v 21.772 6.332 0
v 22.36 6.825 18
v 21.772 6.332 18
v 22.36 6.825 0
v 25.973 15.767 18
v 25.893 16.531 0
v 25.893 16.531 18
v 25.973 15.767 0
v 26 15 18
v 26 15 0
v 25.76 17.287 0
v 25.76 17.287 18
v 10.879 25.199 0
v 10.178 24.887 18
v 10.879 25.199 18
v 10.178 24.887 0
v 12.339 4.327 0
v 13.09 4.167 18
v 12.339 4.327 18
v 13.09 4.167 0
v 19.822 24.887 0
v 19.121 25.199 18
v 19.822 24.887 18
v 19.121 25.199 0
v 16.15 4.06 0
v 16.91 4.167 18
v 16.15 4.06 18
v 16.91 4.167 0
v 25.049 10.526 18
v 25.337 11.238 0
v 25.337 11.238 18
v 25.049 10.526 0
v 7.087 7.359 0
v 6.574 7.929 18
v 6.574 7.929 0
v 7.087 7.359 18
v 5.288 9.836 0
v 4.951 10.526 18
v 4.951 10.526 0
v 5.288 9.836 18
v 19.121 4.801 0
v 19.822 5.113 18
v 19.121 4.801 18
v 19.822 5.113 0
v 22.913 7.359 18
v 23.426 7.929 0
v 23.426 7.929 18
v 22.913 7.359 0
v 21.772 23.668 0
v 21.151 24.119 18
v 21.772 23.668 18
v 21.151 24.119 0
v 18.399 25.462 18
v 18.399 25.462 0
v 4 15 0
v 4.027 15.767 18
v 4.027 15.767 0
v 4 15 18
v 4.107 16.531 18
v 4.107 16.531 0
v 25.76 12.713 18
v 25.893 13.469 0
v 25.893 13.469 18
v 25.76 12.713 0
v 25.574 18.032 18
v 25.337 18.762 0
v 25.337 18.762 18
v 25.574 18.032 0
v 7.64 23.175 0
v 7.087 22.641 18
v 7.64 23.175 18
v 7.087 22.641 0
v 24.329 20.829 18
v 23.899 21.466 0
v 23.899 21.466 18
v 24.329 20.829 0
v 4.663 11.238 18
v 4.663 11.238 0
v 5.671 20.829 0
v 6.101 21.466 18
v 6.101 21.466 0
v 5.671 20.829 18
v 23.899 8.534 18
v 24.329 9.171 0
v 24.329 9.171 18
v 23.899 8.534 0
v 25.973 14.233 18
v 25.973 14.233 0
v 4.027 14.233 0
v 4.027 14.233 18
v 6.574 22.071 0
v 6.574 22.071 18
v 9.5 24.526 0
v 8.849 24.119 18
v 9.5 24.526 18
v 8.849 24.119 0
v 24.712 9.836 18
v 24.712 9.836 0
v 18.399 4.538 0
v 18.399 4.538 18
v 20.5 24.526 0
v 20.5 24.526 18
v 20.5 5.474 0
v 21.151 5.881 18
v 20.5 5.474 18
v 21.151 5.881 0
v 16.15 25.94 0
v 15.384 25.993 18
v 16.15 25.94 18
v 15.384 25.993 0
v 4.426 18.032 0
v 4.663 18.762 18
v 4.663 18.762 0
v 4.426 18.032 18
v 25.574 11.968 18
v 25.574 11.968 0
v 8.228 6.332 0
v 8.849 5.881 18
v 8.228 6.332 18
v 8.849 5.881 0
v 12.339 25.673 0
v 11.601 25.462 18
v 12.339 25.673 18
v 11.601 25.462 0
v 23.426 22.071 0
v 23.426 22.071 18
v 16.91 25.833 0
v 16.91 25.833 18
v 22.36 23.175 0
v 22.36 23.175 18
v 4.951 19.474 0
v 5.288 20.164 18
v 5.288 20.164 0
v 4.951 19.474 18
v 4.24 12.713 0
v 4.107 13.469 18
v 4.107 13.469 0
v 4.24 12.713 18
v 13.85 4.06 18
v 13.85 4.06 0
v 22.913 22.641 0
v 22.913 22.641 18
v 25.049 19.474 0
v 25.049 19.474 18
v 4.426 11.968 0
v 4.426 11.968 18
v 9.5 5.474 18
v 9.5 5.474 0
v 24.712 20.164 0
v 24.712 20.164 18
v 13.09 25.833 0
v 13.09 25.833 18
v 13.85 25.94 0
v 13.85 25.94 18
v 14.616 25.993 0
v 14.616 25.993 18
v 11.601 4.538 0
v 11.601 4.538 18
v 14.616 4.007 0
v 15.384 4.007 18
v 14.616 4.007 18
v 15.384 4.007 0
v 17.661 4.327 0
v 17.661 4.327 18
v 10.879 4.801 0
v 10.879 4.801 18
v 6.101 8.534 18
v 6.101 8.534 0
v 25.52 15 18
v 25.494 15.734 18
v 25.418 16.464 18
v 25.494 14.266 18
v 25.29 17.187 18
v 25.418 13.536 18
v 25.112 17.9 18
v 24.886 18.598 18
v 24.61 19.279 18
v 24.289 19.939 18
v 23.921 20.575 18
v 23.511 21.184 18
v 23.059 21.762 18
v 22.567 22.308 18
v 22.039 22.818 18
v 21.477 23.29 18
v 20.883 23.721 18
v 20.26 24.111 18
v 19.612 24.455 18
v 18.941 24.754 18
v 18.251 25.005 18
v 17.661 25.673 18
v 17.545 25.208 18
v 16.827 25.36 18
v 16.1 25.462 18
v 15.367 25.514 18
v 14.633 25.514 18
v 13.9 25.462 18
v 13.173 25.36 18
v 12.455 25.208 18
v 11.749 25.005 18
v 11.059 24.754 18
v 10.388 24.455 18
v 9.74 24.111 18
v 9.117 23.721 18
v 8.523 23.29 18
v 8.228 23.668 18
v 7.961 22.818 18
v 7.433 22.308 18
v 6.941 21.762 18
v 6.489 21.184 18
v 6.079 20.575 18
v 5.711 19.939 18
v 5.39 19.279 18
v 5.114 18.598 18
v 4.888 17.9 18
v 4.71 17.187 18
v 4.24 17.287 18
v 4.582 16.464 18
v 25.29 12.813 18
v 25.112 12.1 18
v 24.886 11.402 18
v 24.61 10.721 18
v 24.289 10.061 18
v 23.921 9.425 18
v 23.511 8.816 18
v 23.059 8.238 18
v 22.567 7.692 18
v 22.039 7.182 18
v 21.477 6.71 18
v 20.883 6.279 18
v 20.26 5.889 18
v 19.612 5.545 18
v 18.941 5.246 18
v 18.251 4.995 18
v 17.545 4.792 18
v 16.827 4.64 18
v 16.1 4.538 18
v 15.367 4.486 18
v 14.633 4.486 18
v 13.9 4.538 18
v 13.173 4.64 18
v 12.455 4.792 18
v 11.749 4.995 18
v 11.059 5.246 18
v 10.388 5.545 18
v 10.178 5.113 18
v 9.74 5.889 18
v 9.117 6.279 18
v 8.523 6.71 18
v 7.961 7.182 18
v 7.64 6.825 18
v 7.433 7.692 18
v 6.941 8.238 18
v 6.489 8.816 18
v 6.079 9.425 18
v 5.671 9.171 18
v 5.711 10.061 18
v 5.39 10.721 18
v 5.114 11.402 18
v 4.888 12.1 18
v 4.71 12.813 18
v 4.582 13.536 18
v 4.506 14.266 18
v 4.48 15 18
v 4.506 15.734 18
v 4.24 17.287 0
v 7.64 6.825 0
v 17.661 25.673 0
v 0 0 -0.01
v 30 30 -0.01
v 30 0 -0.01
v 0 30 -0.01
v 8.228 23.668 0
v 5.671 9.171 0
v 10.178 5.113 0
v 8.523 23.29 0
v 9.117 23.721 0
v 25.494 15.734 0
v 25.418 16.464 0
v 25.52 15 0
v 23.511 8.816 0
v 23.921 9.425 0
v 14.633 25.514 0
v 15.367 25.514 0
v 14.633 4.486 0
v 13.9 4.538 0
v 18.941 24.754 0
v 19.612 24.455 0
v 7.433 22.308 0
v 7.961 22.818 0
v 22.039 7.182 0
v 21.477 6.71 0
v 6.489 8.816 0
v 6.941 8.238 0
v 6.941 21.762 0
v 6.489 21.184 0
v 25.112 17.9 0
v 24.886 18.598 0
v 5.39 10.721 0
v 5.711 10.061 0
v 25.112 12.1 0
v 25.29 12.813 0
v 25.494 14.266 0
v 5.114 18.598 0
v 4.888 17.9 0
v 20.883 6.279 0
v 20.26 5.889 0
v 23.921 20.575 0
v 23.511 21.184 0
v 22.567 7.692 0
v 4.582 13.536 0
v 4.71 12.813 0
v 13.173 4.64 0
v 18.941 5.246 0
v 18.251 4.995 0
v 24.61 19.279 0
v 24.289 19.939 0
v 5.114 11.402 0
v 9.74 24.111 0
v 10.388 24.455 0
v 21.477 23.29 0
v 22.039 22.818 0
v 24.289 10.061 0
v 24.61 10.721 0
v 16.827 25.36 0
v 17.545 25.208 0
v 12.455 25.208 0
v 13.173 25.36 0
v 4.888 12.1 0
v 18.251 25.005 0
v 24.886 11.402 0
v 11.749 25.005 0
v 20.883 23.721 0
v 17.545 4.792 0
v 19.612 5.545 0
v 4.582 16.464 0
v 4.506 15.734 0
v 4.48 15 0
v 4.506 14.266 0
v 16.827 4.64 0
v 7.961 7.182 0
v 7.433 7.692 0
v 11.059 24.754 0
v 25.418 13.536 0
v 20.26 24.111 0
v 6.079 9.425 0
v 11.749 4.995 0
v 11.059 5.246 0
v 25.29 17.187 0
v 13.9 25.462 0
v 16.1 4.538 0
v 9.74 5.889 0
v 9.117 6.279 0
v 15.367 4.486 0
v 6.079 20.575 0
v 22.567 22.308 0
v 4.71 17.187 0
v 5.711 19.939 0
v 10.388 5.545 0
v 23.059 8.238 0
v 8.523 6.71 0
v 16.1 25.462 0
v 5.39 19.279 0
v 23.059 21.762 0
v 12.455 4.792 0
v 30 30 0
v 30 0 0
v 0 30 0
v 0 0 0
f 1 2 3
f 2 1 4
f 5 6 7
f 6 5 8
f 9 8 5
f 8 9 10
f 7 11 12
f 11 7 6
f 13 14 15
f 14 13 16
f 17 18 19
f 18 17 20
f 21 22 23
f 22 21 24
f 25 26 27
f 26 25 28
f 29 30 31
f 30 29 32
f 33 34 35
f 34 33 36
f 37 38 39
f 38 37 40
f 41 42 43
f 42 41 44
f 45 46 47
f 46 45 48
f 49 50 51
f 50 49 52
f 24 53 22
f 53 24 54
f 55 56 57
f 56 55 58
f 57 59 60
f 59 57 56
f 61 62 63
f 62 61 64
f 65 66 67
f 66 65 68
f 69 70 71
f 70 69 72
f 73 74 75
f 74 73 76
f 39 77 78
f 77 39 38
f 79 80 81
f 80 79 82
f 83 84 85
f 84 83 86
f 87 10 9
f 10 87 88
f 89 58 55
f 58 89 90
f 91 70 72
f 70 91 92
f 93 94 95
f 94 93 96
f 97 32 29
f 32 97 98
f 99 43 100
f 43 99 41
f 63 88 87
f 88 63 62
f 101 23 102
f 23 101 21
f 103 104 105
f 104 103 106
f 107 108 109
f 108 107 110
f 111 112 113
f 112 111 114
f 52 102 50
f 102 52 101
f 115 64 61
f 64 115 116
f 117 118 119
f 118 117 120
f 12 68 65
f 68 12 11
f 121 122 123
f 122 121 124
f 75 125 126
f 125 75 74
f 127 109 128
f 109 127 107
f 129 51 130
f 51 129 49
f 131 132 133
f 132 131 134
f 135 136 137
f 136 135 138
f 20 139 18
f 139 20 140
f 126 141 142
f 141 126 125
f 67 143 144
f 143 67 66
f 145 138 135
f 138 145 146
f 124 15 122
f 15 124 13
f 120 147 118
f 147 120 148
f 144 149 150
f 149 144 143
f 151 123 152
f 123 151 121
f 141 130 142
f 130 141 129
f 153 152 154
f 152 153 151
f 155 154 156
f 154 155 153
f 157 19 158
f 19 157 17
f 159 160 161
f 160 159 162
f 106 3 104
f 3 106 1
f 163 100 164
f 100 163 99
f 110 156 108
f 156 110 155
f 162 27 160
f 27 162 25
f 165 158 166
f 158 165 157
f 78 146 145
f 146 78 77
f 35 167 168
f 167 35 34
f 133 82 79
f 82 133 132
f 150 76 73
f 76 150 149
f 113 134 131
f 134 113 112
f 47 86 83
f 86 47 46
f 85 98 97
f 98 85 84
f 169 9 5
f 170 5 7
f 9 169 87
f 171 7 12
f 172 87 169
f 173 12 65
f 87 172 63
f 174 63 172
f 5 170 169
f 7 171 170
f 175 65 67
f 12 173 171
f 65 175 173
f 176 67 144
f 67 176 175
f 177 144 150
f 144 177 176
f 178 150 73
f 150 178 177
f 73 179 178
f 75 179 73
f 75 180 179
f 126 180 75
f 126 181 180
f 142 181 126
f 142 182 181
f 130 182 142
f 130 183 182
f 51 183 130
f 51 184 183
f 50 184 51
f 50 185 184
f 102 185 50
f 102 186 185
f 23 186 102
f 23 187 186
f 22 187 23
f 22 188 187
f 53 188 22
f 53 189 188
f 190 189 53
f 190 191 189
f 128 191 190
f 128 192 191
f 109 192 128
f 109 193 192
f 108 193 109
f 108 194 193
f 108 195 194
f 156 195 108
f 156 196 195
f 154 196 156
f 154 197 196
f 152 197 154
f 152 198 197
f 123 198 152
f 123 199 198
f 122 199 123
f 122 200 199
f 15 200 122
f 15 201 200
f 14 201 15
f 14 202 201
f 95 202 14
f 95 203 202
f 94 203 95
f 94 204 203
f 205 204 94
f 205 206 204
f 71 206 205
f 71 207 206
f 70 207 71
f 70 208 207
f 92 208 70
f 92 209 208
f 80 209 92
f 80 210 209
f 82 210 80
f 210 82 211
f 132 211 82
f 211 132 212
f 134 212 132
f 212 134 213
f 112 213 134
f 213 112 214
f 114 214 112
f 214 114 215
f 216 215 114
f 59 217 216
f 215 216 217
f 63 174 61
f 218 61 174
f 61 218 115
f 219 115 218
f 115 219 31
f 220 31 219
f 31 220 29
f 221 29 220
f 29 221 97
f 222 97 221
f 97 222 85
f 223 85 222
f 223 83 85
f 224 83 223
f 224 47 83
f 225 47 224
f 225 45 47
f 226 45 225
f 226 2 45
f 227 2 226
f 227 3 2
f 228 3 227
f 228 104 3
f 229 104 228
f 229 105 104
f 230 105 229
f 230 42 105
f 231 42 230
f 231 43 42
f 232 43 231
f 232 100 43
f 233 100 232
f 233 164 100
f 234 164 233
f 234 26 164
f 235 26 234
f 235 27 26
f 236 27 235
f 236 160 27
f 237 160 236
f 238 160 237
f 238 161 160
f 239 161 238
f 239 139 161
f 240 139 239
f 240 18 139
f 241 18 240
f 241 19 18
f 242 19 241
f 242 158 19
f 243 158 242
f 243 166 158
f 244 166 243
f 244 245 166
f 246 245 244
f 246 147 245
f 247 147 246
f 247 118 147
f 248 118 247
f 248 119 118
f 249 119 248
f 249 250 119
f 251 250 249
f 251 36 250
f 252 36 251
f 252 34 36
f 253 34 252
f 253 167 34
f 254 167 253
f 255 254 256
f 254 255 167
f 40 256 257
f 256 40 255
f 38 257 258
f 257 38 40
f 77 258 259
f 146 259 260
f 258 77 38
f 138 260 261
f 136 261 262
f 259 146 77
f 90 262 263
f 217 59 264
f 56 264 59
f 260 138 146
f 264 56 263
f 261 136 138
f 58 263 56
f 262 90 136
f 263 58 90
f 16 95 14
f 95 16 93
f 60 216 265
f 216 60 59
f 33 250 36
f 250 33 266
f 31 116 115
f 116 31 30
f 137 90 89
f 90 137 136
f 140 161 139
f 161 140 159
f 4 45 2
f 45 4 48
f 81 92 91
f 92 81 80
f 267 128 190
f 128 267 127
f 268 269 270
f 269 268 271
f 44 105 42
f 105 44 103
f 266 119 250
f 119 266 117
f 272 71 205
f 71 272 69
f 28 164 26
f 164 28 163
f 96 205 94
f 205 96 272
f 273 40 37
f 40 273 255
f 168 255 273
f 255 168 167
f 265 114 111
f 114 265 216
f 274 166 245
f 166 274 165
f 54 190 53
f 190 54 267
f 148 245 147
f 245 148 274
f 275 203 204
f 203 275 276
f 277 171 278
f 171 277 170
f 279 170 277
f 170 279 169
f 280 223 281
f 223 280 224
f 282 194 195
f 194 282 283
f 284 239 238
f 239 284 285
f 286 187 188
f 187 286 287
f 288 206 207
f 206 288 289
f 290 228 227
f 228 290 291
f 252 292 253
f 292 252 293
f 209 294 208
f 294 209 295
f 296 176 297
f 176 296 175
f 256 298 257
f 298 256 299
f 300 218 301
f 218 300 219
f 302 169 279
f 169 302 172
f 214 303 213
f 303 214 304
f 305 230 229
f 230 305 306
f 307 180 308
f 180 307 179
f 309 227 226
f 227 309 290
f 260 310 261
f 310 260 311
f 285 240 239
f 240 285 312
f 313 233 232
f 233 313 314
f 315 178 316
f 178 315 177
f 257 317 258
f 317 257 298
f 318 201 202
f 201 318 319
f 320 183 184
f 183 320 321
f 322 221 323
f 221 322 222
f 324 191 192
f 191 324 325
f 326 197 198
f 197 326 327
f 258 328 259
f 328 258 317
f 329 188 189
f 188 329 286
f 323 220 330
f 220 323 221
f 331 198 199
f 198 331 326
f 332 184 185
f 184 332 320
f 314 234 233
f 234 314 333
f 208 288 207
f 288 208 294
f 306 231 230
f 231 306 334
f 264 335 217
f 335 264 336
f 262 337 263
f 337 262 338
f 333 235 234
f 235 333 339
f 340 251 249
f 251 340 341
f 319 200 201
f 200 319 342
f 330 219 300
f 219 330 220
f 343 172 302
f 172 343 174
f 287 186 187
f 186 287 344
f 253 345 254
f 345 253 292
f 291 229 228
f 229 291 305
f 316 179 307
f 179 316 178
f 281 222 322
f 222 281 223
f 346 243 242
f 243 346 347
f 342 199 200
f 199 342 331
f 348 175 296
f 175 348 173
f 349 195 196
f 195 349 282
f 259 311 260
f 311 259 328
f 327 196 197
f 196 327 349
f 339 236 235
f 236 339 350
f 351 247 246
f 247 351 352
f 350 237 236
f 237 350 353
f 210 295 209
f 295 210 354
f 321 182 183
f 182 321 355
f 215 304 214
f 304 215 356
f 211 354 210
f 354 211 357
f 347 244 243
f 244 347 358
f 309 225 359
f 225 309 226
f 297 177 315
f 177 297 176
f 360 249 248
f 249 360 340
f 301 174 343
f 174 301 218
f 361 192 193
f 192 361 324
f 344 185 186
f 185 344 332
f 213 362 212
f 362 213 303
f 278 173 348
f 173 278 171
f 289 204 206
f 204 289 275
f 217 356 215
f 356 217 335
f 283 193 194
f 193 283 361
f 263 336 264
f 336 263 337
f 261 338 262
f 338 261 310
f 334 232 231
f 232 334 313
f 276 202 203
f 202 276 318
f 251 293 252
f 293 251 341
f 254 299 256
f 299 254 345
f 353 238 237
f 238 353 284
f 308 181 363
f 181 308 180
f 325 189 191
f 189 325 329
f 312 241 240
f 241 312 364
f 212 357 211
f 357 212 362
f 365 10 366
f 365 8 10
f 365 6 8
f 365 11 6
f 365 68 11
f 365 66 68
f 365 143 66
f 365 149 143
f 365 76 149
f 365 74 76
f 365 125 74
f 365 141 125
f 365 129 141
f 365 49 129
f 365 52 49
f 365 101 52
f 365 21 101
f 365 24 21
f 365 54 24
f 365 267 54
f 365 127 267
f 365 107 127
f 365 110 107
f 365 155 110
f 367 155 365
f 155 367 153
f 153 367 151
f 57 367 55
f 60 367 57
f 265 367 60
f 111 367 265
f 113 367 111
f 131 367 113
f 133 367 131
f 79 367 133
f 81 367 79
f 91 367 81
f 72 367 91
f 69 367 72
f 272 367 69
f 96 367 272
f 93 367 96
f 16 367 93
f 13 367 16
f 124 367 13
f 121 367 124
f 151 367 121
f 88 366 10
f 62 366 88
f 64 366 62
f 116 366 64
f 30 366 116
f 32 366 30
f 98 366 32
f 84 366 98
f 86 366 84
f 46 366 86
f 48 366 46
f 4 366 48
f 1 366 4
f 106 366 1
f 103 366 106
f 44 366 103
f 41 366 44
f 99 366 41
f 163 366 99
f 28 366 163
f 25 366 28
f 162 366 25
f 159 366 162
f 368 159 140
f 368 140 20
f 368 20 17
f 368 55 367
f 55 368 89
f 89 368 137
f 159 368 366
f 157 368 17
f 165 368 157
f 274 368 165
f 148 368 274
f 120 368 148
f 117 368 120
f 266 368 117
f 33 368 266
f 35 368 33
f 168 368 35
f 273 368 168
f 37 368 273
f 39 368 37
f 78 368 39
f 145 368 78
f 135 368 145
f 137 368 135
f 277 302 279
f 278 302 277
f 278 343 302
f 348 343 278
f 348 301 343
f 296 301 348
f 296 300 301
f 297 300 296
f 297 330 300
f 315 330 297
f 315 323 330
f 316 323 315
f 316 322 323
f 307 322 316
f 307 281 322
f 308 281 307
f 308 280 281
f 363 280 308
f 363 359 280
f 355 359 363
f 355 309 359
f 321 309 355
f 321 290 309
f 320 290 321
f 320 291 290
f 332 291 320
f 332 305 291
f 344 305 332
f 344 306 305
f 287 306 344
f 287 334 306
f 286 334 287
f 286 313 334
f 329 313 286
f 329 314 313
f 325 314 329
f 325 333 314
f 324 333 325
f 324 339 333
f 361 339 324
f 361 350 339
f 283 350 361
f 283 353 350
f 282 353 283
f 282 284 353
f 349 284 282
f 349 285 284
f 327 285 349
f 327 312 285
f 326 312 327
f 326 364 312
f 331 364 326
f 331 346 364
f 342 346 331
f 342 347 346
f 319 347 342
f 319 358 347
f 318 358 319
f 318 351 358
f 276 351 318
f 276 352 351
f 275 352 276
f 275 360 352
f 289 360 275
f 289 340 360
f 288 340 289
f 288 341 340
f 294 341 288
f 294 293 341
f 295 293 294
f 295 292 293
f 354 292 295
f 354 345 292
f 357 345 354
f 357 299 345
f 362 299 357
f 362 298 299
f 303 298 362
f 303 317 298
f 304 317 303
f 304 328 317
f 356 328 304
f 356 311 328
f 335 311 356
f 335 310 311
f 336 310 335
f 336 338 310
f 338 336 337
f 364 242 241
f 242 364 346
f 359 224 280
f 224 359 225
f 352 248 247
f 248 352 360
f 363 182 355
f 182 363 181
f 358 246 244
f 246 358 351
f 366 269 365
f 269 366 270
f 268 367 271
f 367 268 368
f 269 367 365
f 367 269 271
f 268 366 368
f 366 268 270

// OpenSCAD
// file: ../Base/PlacementOptions.scad
// Fischertechnik Box Foundation
// Placement Options

// Alignment
NoAlign = 0;
AlignLeft = 1;
AlignBottom = 2;
AlignCenter = 3;
AlignRight = 4;
AlignTop = 5;

// Element rotation degree steps
rotations = [0, -90, -180, -270];

// Rotation
NoRotation = 0;
Rotate0 = 0;
Rotate90 = 1;
Rotate180 = 2;
Rotate270 = 3;

// Docking (seen from above)
NoDock = -1;
DockLeft = 0;
DockTop = 1;
DockRight = 2;
DockCorner = 2;
DockBottom = 3;

// Web corners
LowerLeft = 0;
UpperLeft = 1;
UpperRight = 2;
LowerRight = 3;

// Web position relative to corner
LeftOfCorner = 0;
RightOfCorner = 1;
// file: ../Base/Boxes.scad
// Fischertechnik Box Foundation
// Pre-designed Boxes

use <Constants.scad>

include <PlacementOptions.scad>

box190Width = 190;
box190Depth = 130;
box130Width = 130;
box130Depth = 95;

// Values are from an original ec3 box
topBottomDifference = 1.5;
outerHeight = 40;
innerHeight = 38.2;
baseThickness = outerHeight - innerHeight;
stackExcess = 5.7;
radius = 3.5;
wallThickness = 1.5;
tolerance = 0.2;
stackOffset = innerHeight - stackExcess;

boxUsageHeight = stackOffset;
boxWallThickness = wallThickness;
boxBaseThickness = baseThickness;
boxWebWidth = 3.0;

// getBoxWallThickness()
// Gets the wall thickness of a Fischertechnik Box
function getBoxWallThickness() = boxWallThickness;

// getBoxUsageHeight()
// Gets the usable height of a Fischertechnik box
function getBoxUsageHeight() = boxUsageHeight;

// getBoxInnerHeight()
// Gets the inner height of a Fischertechnik box, including the stack excess
function getBoxInnerHeight() = innerHeight;

// getBoxBaseThickness()
// Gets the thickness of the Fischertechnik box base.
function getBoxBaseThickness() = boxBaseThickness;

// getBoxWebWidth()
// Gets the width of a box web
function getBoxWebWidth() = boxWebWidth;

// getBox190Space()
// Gets the usable inner space of a Box 190 as an x/y-list
function getBox190Space() = [
    box190Width - 2*getBoxWallThickness() - topBottomDifference, 
    box190Depth - 2*getBoxWallThickness() - topBottomDifference ];

// BoxBase(width, depth)
// Creates an empty stackable Fischertechnik compatible box
// width = Outer width of the box (190, 130, ...)
// depth = Outer depth of the box (130, 95, ...)

module BoxBase(width, depth, height=outerHeight) {    
    thinPlate = 0.01;

    innerHeight = height - baseThickness;    
    
    module BodyPlate(width, depth) {
        translate([radius, radius])
        hull() {
            w = width-2*radius;
            d = depth-2*radius;
            cube([w, d, thinPlate]);
            cylinder(thinPlate, r=radius, $fn=getFragments());
            translate([w, 0])
                cylinder(thinPlate, r=radius, $fn=getFragments());
            translate([w, d])
                cylinder(thinPlate, r=radius, $fn=getFragments());
            translate([0, d])
                cylinder(thinPlate, r=radius, $fn=getFragments());
        }
    }
    
    module Body(tolerance=tolerance) {
        hull() {
            // Bottom with tolerance to fit into the original boxes when stacked
            translate([-wallThickness+tolerance, -wallThickness+tolerance, -baseThickness])
                BodyPlate(width-topBottomDifference-2*tolerance, depth-topBottomDifference-2*tolerance);
            
            // Top
            translate([-wallThickness-topBottomDifference/2, -wallThickness-topBottomDifference/2, innerHeight-thinPlate])
                BodyPlate(width, depth);
         }
    }

    module Cutoff() {
        hull() {
            coWidth = width - 2*wallThickness;
            coDepth = depth - 2*wallThickness;
            
            // Bottom
            BodyPlate(coWidth-topBottomDifference, coDepth-topBottomDifference);

            // Top
            translate([-topBottomDifference/2, -topBottomDifference/2, innerHeight+thinPlate]) 
                BodyPlate(coWidth, coDepth);
        }
    }
    
    difference() {        
        Body();
        Cutoff();
        stackOffset = innerHeight - stackExcess;
        translate([0, 0, stackOffset + baseThickness])
            Body(tolerance=0);
    }
}

// Creates the Fischertechnik empty box 130x190 mm and places it at position 0,0
// 190x130 are the outer sizes, the inner space is slightly smaller. Use getBox190Space() to get the inner sizes.
// The box is positioned that the usable inner space is at the 0,0,0 position. The

module Box190() {
    BoxBase(box190Width, box190Depth);
}

// Gets the usable inner space of a Box 130 as an x/y-list
function getBox130Space() = [
    box130Width - 2*getBoxWallThickness() - topBottomDifference, 
    box130Depth - 2*getBoxWallThickness() - topBottomDifference ];

// Creates the Fischertechnik empty box 95x130 mm and places it at position 0,0
// 190x130 are the outer sizes, the inner space is slightly smaller. Use getBox190Space() to get the inner sizes.
// The box is positioned that the usable inner space is at the 0,0,0 position. The

module Box130() {
    BoxBase(box130Width, box130Depth);
}

// Creates a web at the specified box walls
// corner 0 = LowerLeft, 1 = UpperLeft, 2 = UpperRight, 3 = LowerRight
// side 0 = LeftOfCorner, 1 = RightOfCorner
// distance = Distance in mm from the corner
// boxSpace = inner width and depth of the box (default: Box 190)
// webWidth = length of the web (default is 3 mms)
// webThickness = thickness of the web (default is 1 mm)

module BoxWeb(corner, side, distance, boxSpace=getBox190Space(), webWidth=getBoxWebWidth(), webThickness=1.0) {
    sink = getBoxWallThickness()/2;

    width = (corner % 2 == 0) ? 
            (side == LeftOfCorner ? webWidth : webThickness) :
            (side == LeftOfCorner ? webThickness : webWidth);

    depth = (corner % 2 == 0) ? 
            (side == RightOfCorner ? webWidth : webThickness) :
            (side == RightOfCorner ? webThickness : webWidth);
    
    xDiff = corner == LowerLeft ? 
                (side == LeftOfCorner ? -sink : distance) :
            (corner == UpperLeft ?                
                (side == LeftOfCorner ? distance : -sink) :
            (corner == UpperRight ?
                (side == LeftOfCorner ? boxSpace.x-webWidth+sink : boxSpace.x-distance-webThickness) :
                (side == LeftOfCorner ? boxSpace.x-distance-webThickness: boxSpace.x-webWidth+sink)));

    yDiff = corner == LowerLeft ? 
                (side == RightOfCorner ? -sink : distance) :
            (corner == UpperLeft ?
                (side == RightOfCorner ? boxSpace.y-distance : boxSpace.y-webWidth+sink) :
            (corner == UpperRight ?
                (side == RightOfCorner ? boxSpace.y-webWidth+sink : boxSpace.y-distance) :
                (side == RightOfCorner ? distance : -sink)));
    
    translate([xDiff, yDiff, -getExcess()])
        cube([width, depth, boxUsageHeight + 2*getExcess()]);
}
// file: ../Base/Rotation.scad
// Fischertechnik Box Foundation
// Geometry Helpers Rotation

include <PlacementOptions.scad>

// getRotatedSpace(space, rotation=NoRotation)
// Rotates the space dependent on the specified rotation

function getRotatedSpace(space, rotation=NoRotation) = [
    (rotation == Rotate90 || rotation == Rotate270) ? space.y : space.x,
    (rotation == Rotate90 || rotation == Rotate270) ? space.x : space.y
];

// Rotates the given space around the fixed left lower corner
// space = the space the children needs as width/depth list [width,depth]
// rotation = 0 Rotate0 degrees, 1 Rotate90 degrees, 2 Rotate180 degrees, 3 Rotate270 degrees (equivalent to -90)

module RotateFix(space, rotation=NoRotation) {
    dy = (rotation == Rotate0 || rotation == Rotate270) ? 0 :
        (rotation == Rotate90) ? space.x :
        space.y;
    dx = (rotation < Rotate180) ? 0 :
        (rotation == Rotate180) ? space.x :
        space.y;
    
    translate([dx, dy, 0])
        rotate([0, 0, rotations[rotation]])
            children();
}
// file: ../Base/Alignment.scad
// Fischertechnik Box Foundation
// Geometry Helpers Alignment

include <PlacementOptions.scad>

// getAlignedX(elementWidth, spaceWidth, align=AlignRight, offset=0)
// Gets the aligned X offset of an element with the given
// width in the given space.
// elementWidth = The width of the element to positon
// spaceWidth = The space where the element should be aligned
// align = 0 AlignLeft, 1 AlignCenter, 2 AlignRight
// offset = an optional offset from the aligned position. When
// aligned left or centered, then positive values are in X direction.
// When aligned right then positive values are in negative X direction.

function getAlignedX(elementWidth, spaceWidth, align=AlignRight, offset=0) =
    (align == AlignLeft) ?
        offset :
        ((align == AlignCenter) ?
        (spaceWidth - elementWidth)/2 + offset :
        spaceWidth - offset - elementWidth);

// getAlignedY(elementDepth, spaceDepth, align=AlignTop, offset=0)
// Gets the aligned Y offset of an element with the given
// depth in the given space.
// elementDepth = The depth of the element to positon
// spaceDepth = The space where the element should be aligned
// align = 0 AlignBottom, 1 AlignCenter, 2 AlignTop
// offset = an optional offset from the aligned position. When
// aligned bottom or centered, then positive values are in Y direction.
// When aligned top then positive values are in negative Y direction.

function getAlignedY(elementDepth, spaceDepth, align=AlignTop, offset=0) =
    (align == AlignBottom) ?
        offset :
        ((align == AlignCenter) ?
        (spaceDepth - elementDepth)/2 + offset :
        spaceDepth - offset - elementDepth);
// file: ../Base/Placement.scad
// Fischertechnik Box Foundation
// Geometry Helpers Placement

use <Constants.scad>
use <Alignment.scad>
use <Rotation.scad>
use <Boxes.scad>

include <PlacementOptions.scad>

// Place(x=0, y=0, elementSpace=[0,0], alignX=AlignLeft, alignY=AlignBottom, rotation=Rotate0, boxSpace=getBox190Space())
// Places the child at the specified position
// y = Y-Position. This is a relative position when an X aligment is specified.
// x = X-Position. This is a relative position when an Y aligment is specified.
// elementSpace = space of the element to be placed [x,y]
// alignX = -1=NoAlign, 0 AlignLeft, 1 AlignCenter, 3 AlignRight (elementSpace and boxSpace required!)
// alignY = -1=NoAlign, 2 AlignBottom, 1 AlignCenter, 4 AlignTop (elementSpace and boxSpace required!)
// rotation = 0 Rotate0 0 degrees, 1 Rotate90 90 degrees, 
// 2 Rotate180 180 degrees, 3 Rotate270 270 degrees (equivalent to -90)
// boxSpace = Inner space of the box where the placement occurs [x,y] - default is Box 190x130 inner space

module Place(x=0, y=0, elementSpace=[0,0], 
  alignX=AlignLeft, alignY=AlignBottom, 
  rotation=NoRotation, boxSpace=getBox190Space()) {

    module Position(x, y, space, rotation=Rotate0) {
        translate([x, y, 0])
            RotateFix(space, rotation)
                children();
    }

    space = getRotatedSpace(elementSpace, rotation);
    alignedX = getAlignedX(space.x, boxSpace.x, alignX, x);
    alignedY = getAlignedY(space.y, boxSpace.y, alignY, y);
    Position(alignedX, alignedY, elementSpace, rotation)
        children();
}

// Center(space=getBox130Space(), elementSpace=[0,0])
// space = Space where the children is centered. For cylinder use centered=true and no elementSpace.
// elementSpace = space of the element to be centered [x,y]

module Center(space=getBox190Space(), elementSpace=[0,0]) {
    Place(elementSpace=elementSpace, boxSpace=space, alignX=AlignCenter, alignY=AlignCenter)
        children();
}

// CenterHorizontal(width=0, y=0, offset=0, space=getBox130Space())
// width = Width of the element to be placed.
// y = Y position of the element
// offset = Offset from the center position (negative will be left of the center)
// space = Space where the element is placed

module CenterHorizontal(width=0, y=0, offset=0, space=getBox190Space()) {
    Place(x=offset, y=y, elementSpace=[width, 0], boxSpace=space, alignX=AlignCenter)
        children(0);
}

// CenterVertical(depth=0, x=0, offset=0, space=getBox130Space())
// depth = Depth of the element to be placed.
// x = X position of the element
// offset = Offset from the center position (negative will be down of the center)
// space = Space where the element is placed

module CenterVertical(depth=0, x=0, offset=0, space=getBox190Space()) {
    Place(x=x, y=offset, elementSpace=[0, depth], boxSpace=space, alignY=AlignCenter)
        children(0);
}

// getIsVertical(align)
// True if the specified alignment needs a vertical orientation for a divider (AlignRight, AlignLeft)

function getIsVertical(align) = (align == AlignRight || align == AlignLeft);

// getIsHorizontal(align)
// True if the specified alignment needs a horizontal orientation for a divider (AlignTop, AlignBottom)

function getIsHorizontal(align) = (align == AlignTop || align == AlignBottom);
// file: ../Base/Constants.scad
// Fischertechnik Box Foundation
// Constants

// Constant values necessary for multiple elements

// Base constants
dividerThickness = 1.2;
excess = 0.01;
fragments = 90;
tolerance = 0.8;

// Gets the thickness of a divider 
function getDividerThickness() = dividerThickness;

// Gets the excess that is used to merge walls into each other
function getExcess() = excess;

// Gets amount of fragments of a cylinder
function getFragments() = fragments;

// Gets the inner tolerance of a frame to each side
function getTolerance() = tolerance;


// Fischertechnik specific constants
axisDiameter = 4;
axisBottomDiameter = axisDiameter + 1;
standardEdgeDistance = 2.5;
standardWebDistance = 11.5;
standardCornerLength = 15;
tubeWallFactor = 0.8;
smallPartsFrameHeight = 20;

// Gets axis diameter
function getAxisDiameter() = axisDiameter;

// Gets axis bottom diameter for thicker part at the bottom
function getAxisBottomDiameter() = axisBottomDiameter;

// gets the standard distance to the wall of the box for dockable frames with webs
function getStandardEdgeDistance() = standardEdgeDistance;

// gets the standard distance of each web to the corner of the dockable frame
function getStandardWebDistance() = standardWebDistance;

// gets the standard length of the corner walls of a dockable frame
function getStandardCornerLength() = standardCornerLength;

// gets the wall thickness of a tube.
function getTubeWallThickness() = tubeWallFactor * getDividerThickness();

// gets the frame height for docked small parts boxes.
function getSmallPartsFrameHeight() = smallPartsFrameHeight;
// main file
// Fischertechnik Box Library
// Cylinder for Tires 
// 31017

use <../Base/Constants.scad>
use <../Base/Placement.scad>
use <../ModelBase/Simple.scad>

/* [Element Parameters] */
count = 3;

/* [Hidden] */
width = 30;
depth = 30;

// getCylinderTire20Space()
// Gets the space the cylinder tite 20 as width and depth (.x and .y as a list)

function getCylinderTire20Space() = [width, depth];

// CylinderTire30()
// Standing cylinder for tire 30 (newer version).
// If count is less than 3 then a thicker cylinder base is 
// generated to elevate the tires.
// count = count of stapled tires (1 to 4)
// 31017

module CylinderTire20(count=3) {
    innerDiameter = 22;
    outerDiameter = 24.8;
    tireWidth = 6;

    minimumInnerHeight = 3 * tireWidth;
    neededHeight = count * tireWidth;
    actualHeight = max(neededHeight, minimumInnerHeight);
    
    innerHeight = actualHeight;
    outerHeight =  actualHeight - neededHeight;

    Space(getCylinderTire20Space());
    
    Center(getCylinderTire20Space())
        LeveledTube(innerHeight, innerDiameter, outerHeight, outerDiameter);
}

// Tests
color("lightgray")
CylinderTire20(count);
